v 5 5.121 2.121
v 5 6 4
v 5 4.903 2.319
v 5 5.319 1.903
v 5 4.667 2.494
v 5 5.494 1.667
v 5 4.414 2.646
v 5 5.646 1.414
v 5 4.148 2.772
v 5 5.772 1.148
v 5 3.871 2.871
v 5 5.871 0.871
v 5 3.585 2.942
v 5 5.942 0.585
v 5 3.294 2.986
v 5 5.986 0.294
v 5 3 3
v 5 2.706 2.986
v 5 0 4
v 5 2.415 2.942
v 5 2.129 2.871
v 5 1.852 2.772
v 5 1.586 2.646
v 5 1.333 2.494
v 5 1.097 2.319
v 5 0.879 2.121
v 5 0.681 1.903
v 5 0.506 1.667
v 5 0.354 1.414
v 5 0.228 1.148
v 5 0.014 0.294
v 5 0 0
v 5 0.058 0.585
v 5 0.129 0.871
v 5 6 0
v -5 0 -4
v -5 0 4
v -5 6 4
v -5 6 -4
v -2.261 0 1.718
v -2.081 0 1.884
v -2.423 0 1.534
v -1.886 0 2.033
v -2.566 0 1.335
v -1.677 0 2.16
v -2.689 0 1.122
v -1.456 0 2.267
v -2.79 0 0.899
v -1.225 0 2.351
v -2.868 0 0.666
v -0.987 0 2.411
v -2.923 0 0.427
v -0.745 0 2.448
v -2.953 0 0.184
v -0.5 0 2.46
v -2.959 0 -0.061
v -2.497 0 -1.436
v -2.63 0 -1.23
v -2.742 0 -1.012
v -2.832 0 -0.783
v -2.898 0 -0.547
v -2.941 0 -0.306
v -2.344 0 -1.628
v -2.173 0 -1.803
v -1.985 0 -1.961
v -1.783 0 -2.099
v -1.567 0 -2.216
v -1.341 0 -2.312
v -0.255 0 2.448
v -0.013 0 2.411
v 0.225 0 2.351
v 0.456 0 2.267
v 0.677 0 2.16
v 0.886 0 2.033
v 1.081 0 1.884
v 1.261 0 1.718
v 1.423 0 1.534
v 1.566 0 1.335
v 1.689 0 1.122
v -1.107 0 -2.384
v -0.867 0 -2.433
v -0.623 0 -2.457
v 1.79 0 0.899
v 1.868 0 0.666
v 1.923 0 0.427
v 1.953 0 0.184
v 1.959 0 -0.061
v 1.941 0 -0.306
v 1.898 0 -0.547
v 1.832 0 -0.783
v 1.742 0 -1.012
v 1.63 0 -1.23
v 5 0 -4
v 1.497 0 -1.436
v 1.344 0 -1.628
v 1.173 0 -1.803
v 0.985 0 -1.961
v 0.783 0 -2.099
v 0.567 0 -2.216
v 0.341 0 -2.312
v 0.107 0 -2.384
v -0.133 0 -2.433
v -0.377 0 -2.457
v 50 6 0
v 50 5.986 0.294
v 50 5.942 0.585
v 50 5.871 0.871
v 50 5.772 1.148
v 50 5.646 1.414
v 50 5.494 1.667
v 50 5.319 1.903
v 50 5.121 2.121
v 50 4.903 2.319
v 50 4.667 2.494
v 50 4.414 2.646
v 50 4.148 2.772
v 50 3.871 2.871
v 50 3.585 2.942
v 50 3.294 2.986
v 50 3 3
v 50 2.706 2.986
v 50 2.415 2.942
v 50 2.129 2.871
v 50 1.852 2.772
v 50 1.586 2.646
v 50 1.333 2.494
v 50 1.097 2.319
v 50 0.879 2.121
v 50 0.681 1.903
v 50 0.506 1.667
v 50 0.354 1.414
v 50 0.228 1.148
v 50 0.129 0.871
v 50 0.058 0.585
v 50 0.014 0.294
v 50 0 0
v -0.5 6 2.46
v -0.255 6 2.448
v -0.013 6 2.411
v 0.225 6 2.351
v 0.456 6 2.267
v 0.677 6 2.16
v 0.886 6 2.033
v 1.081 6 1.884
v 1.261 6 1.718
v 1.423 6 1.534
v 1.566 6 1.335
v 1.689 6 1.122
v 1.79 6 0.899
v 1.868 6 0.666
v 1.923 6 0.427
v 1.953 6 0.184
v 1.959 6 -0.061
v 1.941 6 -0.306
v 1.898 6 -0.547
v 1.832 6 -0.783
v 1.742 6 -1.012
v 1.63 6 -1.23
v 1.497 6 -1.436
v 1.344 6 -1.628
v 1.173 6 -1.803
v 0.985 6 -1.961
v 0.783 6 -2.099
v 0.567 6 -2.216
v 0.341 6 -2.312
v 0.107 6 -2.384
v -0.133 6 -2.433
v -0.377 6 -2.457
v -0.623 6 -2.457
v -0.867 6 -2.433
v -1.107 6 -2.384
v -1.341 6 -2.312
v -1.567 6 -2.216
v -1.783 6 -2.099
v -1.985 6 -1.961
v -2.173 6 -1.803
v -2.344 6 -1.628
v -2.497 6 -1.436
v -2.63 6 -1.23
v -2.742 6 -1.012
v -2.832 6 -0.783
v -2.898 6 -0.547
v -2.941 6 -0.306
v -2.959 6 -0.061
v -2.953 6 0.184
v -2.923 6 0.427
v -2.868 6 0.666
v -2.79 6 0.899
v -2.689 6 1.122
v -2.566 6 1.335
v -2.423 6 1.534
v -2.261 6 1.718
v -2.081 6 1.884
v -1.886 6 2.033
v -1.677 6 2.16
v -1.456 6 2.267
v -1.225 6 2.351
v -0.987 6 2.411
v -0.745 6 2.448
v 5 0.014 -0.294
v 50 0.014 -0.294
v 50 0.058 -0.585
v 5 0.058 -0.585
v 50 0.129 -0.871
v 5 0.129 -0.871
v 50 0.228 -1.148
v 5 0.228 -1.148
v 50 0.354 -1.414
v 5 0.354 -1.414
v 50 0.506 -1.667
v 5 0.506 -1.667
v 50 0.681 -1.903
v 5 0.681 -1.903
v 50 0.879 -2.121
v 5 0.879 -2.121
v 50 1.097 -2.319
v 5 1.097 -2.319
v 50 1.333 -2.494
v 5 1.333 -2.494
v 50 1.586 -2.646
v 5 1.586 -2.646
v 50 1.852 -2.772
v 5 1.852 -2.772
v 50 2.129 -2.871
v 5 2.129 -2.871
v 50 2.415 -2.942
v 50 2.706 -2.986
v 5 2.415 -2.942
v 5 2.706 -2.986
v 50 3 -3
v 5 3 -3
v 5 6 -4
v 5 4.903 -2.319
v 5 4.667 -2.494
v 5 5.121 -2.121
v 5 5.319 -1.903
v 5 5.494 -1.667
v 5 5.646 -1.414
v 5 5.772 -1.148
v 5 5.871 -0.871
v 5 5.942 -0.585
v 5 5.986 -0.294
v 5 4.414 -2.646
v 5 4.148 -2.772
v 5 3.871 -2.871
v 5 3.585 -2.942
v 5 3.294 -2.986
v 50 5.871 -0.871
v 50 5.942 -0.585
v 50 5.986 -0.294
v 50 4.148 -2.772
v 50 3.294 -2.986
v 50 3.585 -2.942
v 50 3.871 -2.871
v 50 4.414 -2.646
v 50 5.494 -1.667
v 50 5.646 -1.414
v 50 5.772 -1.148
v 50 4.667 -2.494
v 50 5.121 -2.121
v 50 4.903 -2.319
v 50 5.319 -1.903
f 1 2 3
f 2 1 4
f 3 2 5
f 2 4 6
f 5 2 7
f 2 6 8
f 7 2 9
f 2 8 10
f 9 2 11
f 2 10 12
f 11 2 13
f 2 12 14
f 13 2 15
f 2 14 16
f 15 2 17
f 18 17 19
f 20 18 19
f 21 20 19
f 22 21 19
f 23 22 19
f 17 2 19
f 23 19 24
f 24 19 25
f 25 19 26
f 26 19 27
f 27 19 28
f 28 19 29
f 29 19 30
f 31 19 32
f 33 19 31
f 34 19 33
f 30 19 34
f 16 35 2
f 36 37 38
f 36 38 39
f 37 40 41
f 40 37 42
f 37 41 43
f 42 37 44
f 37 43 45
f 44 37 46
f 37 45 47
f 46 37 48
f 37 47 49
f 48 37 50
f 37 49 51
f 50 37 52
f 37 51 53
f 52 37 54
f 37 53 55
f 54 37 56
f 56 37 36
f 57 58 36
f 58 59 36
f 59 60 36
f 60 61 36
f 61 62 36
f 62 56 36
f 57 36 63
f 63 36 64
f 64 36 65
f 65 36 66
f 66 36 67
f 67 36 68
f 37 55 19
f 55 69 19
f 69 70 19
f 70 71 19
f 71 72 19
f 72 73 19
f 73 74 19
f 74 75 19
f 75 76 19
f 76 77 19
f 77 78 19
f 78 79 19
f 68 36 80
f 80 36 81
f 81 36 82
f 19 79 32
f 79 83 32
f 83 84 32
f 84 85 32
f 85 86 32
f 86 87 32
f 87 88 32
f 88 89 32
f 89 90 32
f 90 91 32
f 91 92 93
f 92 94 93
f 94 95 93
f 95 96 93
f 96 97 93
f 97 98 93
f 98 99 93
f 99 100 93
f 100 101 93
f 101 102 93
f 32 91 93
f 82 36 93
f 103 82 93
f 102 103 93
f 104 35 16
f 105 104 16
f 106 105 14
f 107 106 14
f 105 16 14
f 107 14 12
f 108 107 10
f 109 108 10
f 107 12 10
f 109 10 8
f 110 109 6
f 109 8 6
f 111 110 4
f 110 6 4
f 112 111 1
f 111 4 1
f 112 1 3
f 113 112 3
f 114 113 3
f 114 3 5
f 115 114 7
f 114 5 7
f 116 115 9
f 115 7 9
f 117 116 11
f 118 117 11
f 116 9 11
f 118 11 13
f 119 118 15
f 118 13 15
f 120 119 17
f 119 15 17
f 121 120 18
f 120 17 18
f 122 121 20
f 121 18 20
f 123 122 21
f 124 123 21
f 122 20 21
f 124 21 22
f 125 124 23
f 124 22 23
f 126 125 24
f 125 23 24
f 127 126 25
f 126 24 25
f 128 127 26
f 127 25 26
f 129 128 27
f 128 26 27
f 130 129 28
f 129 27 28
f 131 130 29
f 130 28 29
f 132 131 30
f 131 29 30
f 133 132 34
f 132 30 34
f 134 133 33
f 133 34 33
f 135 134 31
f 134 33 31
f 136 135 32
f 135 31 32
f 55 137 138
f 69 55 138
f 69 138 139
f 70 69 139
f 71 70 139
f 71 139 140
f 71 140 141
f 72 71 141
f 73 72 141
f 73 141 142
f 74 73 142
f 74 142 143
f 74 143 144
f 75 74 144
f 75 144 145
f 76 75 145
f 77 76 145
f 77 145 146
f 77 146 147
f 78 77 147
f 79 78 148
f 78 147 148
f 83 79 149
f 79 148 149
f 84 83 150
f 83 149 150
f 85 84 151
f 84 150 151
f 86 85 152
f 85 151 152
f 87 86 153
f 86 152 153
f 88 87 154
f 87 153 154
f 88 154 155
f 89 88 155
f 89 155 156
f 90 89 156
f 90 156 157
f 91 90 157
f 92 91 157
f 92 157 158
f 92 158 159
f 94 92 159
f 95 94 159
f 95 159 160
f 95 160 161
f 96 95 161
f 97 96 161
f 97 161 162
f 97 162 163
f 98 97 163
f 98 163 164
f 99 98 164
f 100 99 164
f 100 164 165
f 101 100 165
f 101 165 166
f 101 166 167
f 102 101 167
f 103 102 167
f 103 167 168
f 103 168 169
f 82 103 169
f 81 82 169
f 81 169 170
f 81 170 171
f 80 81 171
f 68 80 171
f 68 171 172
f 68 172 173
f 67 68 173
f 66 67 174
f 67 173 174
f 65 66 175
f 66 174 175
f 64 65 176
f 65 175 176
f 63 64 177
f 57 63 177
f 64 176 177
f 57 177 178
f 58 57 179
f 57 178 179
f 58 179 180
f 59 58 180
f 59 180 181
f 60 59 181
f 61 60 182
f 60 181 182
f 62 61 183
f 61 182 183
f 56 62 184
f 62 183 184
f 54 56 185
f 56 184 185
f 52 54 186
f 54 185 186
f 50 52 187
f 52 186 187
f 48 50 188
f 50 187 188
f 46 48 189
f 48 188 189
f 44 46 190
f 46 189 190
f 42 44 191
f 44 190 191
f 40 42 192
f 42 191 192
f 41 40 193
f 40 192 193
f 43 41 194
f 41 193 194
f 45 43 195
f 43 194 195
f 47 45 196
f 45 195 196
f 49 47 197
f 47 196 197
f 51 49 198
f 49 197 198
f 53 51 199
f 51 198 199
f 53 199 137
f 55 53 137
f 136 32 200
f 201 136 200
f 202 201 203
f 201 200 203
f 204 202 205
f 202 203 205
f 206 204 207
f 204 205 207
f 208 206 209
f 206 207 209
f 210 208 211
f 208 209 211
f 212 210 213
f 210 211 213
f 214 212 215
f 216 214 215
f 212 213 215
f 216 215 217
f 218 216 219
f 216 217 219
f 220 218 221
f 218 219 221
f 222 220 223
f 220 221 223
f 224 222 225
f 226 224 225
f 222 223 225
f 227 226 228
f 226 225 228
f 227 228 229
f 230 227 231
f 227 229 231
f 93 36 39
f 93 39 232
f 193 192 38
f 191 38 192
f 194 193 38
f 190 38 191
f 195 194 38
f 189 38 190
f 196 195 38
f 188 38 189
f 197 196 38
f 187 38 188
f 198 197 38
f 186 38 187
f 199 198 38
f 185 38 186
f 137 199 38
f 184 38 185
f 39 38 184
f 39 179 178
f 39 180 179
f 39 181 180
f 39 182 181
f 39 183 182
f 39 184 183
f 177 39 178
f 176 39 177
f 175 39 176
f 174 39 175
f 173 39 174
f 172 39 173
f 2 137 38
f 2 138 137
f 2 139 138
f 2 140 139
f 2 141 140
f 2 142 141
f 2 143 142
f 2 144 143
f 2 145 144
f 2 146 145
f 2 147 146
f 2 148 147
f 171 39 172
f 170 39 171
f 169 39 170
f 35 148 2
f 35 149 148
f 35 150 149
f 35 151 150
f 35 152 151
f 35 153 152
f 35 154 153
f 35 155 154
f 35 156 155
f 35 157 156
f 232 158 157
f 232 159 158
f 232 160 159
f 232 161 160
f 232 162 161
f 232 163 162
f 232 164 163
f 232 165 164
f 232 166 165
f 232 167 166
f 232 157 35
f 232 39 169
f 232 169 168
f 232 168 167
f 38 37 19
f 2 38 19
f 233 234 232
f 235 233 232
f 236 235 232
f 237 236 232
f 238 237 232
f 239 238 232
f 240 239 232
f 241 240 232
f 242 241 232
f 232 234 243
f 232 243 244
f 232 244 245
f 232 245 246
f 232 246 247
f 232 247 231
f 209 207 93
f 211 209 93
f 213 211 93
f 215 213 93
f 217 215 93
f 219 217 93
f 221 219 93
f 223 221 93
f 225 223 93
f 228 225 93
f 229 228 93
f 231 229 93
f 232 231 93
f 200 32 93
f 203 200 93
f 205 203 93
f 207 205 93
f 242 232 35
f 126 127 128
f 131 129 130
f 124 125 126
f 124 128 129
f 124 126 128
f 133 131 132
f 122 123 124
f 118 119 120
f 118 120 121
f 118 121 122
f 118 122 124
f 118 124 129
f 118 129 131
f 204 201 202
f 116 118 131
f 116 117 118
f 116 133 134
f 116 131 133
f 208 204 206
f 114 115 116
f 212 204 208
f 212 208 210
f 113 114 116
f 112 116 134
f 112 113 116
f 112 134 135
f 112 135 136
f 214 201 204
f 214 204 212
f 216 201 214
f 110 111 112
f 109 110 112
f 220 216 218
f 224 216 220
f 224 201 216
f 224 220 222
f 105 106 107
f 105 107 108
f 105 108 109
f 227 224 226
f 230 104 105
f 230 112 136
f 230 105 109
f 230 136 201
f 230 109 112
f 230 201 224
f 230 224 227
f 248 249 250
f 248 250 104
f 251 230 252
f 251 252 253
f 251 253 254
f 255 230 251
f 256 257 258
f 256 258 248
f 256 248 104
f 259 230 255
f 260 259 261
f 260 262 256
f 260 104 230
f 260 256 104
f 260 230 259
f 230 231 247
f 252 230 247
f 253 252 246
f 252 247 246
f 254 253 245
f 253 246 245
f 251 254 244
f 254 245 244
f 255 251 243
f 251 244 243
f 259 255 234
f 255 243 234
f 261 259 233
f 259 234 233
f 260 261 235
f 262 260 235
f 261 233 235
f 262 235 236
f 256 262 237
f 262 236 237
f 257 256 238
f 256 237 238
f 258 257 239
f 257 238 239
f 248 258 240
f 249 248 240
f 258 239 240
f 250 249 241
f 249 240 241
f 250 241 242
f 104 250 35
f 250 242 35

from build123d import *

# Parameters (mm, degrees)
SKETCH_1_W          = 10
SKETCH_1_H          = 8
EXTRUDE_1_DEPTH     = 6
EXTRUDE_2_DEPTH     = 45
CUT_EXTRUDE_1_REACH = 52.517
SKETCH_3_R          = 2.46


with BuildPart() as part:
    # 草图1 → 凸台-拉伸1 (new body)
    with BuildSketch(Plane(origin=(0, 0, 0), x_dir=(1, 0, 0), z_dir=(0, 1, 0))):
        Rectangle(SKETCH_1_W, SKETCH_1_H)
    extrude(amount=EXTRUDE_1_DEPTH)

    # 草图2 → 凸台-拉伸2 (add)
    with BuildSketch(Plane(origin=(5, 0, 0), x_dir=(0, 0, -1), z_dir=(1, 0, 0))):
        with BuildLine():
            ThreePointArc((0, 6), (-3, 3), (0, 0))
            Line((0, 0), (0, 6))
        make_face()
        with BuildLine():
            Line((0, 6), (0, 0))
            ThreePointArc((0, 0), (2.121320344, 0.878679656), (3, 3))
            ThreePointArc((3, 3), (2.121320344, 5.121320344), (0, 6))
        make_face()
    extrude(amount=EXTRUDE_2_DEPTH)

    # 草图3 → 切除-拉伸1 (cut, up to next)
    with BuildSketch(Plane(origin=(0, 6, 0), x_dir=(1, 0, 0), z_dir=(0, 1, 0)), mode=Mode.PRIVATE) as cut_extrude_1_sk1:
        with Locations(Location((-0.5, 0, 0), (0, 0, 270))):
            Circle(SKETCH_3_R)
    cut_extrude_1_tool1 = extrude(cut_extrude_1_sk1.sketch, amount=-CUT_EXTRUDE_1_REACH, mode=Mode.PRIVATE) & part.part
    add(cut_extrude_1_tool1.solids().sort_by_distance((-0.5, 6, 0))[0], mode=Mode.SUBTRACT)


solid = part.part
